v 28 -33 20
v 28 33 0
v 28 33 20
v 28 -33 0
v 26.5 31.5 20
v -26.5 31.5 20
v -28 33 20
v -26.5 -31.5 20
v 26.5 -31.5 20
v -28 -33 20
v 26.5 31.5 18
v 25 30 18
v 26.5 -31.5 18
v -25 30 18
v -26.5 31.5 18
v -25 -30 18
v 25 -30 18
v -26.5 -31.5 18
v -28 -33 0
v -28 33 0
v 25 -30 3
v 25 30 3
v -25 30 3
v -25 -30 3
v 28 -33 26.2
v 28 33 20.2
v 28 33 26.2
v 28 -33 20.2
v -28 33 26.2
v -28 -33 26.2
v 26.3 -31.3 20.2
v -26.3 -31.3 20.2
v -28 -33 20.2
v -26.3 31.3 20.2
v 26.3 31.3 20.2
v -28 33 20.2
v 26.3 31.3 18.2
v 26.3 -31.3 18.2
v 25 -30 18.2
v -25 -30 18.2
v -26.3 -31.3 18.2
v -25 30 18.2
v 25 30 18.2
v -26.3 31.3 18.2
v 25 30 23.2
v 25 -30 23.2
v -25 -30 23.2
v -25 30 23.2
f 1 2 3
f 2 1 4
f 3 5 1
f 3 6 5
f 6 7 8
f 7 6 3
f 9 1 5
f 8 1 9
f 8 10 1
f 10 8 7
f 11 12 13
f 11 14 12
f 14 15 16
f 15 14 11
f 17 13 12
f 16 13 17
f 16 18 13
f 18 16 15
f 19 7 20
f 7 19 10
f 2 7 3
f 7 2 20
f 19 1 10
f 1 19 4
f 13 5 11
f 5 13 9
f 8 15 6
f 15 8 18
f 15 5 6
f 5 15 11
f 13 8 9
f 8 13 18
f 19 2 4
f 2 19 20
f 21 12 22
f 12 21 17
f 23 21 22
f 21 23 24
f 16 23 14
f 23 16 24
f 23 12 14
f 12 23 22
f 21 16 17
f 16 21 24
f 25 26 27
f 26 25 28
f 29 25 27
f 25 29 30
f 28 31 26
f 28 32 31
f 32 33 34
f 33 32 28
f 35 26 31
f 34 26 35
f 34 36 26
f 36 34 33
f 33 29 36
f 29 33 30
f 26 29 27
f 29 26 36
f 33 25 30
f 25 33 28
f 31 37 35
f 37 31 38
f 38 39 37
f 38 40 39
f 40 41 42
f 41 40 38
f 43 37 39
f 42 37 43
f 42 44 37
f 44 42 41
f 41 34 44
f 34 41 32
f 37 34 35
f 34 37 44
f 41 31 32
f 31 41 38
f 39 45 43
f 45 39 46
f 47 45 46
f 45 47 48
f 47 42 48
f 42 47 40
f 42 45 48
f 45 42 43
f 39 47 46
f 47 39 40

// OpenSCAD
// Parametric 3D-printable two-part enclosure
// All units in mm

// Cavity dimensions (internal)
W_int = 50.0;
L_int = 60.0;
H_int_base = 15.0;
H_int_lid = 5.0;

// Wall thickness
t = 3.0;

// Joint/Lip dimensions
lip_h = 2.0;       // height of the mating lip step
lip_w = 1.5;       // width of the mating lip step
c = 0.2;           // nominal print clearance

// Calculated dimensions
W_ext = W_int + 2 * t;
L_ext = L_int + 2 * t;
H_base_ext = H_int_base + t;

module base() {
    difference() {
        union() {
            // Main lower box body
            translate([-W_ext/2, -L_ext/2, 0])
                cube([W_ext, L_ext, H_base_ext]);
            
            // Outer lip extension
            translate([-W_ext/2, -L_ext/2, H_base_ext])
                difference() {
                    cube([W_ext, L_ext, lip_h]);
                    translate([lip_w, lip_w, -0.1])
                        cube([W_ext - 2*lip_w, L_ext - 2*lip_w, lip_h + 0.2]);
                }
        }
        
        // Inner cavity of base
        translate([-W_int/2, -L_int/2, t])
            cube([W_int, L_int, H_base_ext + lip_h + 0.1]);
    }
}

module lid() {
    // Z-coordinates for the lid in its assembled position
    z_lid_lip_bottom = H_base_ext + c;
    z_lid_flange = H_base_ext + lip_h + c;
    z_lid_ceiling = z_lid_lip_bottom + H_int_lid;
    z_lid_top = z_lid_ceiling + t;
    
    difference() {
        union() {
            // Main upper box (outer part of lid)
            translate([-W_ext/2, -L_ext/2, z_lid_flange])
                cube([W_ext, L_ext, z_lid_top - z_lid_flange]);
            
            // Lid's inner lip extending downwards into base cavity
            translate([-(W_ext/2 - lip_w - c), -(L_ext/2 - lip_w - c), z_lid_lip_bottom])
                cube([W_ext - 2*(lip_w + c), L_ext - 2*(lip_w + c), z_lid_flange - z_lid_lip_bottom]);
        }
        
        // Inner cavity of lid
        translate([-W_int/2, -L_int/2, z_lid_lip_bottom - 0.1])
            cube([W_int, L_int, (z_lid_ceiling - z_lid_lip_bottom) + 0.1]);
    }
}

// Render both components in their non-interfering assembled positions
base();
lid();
